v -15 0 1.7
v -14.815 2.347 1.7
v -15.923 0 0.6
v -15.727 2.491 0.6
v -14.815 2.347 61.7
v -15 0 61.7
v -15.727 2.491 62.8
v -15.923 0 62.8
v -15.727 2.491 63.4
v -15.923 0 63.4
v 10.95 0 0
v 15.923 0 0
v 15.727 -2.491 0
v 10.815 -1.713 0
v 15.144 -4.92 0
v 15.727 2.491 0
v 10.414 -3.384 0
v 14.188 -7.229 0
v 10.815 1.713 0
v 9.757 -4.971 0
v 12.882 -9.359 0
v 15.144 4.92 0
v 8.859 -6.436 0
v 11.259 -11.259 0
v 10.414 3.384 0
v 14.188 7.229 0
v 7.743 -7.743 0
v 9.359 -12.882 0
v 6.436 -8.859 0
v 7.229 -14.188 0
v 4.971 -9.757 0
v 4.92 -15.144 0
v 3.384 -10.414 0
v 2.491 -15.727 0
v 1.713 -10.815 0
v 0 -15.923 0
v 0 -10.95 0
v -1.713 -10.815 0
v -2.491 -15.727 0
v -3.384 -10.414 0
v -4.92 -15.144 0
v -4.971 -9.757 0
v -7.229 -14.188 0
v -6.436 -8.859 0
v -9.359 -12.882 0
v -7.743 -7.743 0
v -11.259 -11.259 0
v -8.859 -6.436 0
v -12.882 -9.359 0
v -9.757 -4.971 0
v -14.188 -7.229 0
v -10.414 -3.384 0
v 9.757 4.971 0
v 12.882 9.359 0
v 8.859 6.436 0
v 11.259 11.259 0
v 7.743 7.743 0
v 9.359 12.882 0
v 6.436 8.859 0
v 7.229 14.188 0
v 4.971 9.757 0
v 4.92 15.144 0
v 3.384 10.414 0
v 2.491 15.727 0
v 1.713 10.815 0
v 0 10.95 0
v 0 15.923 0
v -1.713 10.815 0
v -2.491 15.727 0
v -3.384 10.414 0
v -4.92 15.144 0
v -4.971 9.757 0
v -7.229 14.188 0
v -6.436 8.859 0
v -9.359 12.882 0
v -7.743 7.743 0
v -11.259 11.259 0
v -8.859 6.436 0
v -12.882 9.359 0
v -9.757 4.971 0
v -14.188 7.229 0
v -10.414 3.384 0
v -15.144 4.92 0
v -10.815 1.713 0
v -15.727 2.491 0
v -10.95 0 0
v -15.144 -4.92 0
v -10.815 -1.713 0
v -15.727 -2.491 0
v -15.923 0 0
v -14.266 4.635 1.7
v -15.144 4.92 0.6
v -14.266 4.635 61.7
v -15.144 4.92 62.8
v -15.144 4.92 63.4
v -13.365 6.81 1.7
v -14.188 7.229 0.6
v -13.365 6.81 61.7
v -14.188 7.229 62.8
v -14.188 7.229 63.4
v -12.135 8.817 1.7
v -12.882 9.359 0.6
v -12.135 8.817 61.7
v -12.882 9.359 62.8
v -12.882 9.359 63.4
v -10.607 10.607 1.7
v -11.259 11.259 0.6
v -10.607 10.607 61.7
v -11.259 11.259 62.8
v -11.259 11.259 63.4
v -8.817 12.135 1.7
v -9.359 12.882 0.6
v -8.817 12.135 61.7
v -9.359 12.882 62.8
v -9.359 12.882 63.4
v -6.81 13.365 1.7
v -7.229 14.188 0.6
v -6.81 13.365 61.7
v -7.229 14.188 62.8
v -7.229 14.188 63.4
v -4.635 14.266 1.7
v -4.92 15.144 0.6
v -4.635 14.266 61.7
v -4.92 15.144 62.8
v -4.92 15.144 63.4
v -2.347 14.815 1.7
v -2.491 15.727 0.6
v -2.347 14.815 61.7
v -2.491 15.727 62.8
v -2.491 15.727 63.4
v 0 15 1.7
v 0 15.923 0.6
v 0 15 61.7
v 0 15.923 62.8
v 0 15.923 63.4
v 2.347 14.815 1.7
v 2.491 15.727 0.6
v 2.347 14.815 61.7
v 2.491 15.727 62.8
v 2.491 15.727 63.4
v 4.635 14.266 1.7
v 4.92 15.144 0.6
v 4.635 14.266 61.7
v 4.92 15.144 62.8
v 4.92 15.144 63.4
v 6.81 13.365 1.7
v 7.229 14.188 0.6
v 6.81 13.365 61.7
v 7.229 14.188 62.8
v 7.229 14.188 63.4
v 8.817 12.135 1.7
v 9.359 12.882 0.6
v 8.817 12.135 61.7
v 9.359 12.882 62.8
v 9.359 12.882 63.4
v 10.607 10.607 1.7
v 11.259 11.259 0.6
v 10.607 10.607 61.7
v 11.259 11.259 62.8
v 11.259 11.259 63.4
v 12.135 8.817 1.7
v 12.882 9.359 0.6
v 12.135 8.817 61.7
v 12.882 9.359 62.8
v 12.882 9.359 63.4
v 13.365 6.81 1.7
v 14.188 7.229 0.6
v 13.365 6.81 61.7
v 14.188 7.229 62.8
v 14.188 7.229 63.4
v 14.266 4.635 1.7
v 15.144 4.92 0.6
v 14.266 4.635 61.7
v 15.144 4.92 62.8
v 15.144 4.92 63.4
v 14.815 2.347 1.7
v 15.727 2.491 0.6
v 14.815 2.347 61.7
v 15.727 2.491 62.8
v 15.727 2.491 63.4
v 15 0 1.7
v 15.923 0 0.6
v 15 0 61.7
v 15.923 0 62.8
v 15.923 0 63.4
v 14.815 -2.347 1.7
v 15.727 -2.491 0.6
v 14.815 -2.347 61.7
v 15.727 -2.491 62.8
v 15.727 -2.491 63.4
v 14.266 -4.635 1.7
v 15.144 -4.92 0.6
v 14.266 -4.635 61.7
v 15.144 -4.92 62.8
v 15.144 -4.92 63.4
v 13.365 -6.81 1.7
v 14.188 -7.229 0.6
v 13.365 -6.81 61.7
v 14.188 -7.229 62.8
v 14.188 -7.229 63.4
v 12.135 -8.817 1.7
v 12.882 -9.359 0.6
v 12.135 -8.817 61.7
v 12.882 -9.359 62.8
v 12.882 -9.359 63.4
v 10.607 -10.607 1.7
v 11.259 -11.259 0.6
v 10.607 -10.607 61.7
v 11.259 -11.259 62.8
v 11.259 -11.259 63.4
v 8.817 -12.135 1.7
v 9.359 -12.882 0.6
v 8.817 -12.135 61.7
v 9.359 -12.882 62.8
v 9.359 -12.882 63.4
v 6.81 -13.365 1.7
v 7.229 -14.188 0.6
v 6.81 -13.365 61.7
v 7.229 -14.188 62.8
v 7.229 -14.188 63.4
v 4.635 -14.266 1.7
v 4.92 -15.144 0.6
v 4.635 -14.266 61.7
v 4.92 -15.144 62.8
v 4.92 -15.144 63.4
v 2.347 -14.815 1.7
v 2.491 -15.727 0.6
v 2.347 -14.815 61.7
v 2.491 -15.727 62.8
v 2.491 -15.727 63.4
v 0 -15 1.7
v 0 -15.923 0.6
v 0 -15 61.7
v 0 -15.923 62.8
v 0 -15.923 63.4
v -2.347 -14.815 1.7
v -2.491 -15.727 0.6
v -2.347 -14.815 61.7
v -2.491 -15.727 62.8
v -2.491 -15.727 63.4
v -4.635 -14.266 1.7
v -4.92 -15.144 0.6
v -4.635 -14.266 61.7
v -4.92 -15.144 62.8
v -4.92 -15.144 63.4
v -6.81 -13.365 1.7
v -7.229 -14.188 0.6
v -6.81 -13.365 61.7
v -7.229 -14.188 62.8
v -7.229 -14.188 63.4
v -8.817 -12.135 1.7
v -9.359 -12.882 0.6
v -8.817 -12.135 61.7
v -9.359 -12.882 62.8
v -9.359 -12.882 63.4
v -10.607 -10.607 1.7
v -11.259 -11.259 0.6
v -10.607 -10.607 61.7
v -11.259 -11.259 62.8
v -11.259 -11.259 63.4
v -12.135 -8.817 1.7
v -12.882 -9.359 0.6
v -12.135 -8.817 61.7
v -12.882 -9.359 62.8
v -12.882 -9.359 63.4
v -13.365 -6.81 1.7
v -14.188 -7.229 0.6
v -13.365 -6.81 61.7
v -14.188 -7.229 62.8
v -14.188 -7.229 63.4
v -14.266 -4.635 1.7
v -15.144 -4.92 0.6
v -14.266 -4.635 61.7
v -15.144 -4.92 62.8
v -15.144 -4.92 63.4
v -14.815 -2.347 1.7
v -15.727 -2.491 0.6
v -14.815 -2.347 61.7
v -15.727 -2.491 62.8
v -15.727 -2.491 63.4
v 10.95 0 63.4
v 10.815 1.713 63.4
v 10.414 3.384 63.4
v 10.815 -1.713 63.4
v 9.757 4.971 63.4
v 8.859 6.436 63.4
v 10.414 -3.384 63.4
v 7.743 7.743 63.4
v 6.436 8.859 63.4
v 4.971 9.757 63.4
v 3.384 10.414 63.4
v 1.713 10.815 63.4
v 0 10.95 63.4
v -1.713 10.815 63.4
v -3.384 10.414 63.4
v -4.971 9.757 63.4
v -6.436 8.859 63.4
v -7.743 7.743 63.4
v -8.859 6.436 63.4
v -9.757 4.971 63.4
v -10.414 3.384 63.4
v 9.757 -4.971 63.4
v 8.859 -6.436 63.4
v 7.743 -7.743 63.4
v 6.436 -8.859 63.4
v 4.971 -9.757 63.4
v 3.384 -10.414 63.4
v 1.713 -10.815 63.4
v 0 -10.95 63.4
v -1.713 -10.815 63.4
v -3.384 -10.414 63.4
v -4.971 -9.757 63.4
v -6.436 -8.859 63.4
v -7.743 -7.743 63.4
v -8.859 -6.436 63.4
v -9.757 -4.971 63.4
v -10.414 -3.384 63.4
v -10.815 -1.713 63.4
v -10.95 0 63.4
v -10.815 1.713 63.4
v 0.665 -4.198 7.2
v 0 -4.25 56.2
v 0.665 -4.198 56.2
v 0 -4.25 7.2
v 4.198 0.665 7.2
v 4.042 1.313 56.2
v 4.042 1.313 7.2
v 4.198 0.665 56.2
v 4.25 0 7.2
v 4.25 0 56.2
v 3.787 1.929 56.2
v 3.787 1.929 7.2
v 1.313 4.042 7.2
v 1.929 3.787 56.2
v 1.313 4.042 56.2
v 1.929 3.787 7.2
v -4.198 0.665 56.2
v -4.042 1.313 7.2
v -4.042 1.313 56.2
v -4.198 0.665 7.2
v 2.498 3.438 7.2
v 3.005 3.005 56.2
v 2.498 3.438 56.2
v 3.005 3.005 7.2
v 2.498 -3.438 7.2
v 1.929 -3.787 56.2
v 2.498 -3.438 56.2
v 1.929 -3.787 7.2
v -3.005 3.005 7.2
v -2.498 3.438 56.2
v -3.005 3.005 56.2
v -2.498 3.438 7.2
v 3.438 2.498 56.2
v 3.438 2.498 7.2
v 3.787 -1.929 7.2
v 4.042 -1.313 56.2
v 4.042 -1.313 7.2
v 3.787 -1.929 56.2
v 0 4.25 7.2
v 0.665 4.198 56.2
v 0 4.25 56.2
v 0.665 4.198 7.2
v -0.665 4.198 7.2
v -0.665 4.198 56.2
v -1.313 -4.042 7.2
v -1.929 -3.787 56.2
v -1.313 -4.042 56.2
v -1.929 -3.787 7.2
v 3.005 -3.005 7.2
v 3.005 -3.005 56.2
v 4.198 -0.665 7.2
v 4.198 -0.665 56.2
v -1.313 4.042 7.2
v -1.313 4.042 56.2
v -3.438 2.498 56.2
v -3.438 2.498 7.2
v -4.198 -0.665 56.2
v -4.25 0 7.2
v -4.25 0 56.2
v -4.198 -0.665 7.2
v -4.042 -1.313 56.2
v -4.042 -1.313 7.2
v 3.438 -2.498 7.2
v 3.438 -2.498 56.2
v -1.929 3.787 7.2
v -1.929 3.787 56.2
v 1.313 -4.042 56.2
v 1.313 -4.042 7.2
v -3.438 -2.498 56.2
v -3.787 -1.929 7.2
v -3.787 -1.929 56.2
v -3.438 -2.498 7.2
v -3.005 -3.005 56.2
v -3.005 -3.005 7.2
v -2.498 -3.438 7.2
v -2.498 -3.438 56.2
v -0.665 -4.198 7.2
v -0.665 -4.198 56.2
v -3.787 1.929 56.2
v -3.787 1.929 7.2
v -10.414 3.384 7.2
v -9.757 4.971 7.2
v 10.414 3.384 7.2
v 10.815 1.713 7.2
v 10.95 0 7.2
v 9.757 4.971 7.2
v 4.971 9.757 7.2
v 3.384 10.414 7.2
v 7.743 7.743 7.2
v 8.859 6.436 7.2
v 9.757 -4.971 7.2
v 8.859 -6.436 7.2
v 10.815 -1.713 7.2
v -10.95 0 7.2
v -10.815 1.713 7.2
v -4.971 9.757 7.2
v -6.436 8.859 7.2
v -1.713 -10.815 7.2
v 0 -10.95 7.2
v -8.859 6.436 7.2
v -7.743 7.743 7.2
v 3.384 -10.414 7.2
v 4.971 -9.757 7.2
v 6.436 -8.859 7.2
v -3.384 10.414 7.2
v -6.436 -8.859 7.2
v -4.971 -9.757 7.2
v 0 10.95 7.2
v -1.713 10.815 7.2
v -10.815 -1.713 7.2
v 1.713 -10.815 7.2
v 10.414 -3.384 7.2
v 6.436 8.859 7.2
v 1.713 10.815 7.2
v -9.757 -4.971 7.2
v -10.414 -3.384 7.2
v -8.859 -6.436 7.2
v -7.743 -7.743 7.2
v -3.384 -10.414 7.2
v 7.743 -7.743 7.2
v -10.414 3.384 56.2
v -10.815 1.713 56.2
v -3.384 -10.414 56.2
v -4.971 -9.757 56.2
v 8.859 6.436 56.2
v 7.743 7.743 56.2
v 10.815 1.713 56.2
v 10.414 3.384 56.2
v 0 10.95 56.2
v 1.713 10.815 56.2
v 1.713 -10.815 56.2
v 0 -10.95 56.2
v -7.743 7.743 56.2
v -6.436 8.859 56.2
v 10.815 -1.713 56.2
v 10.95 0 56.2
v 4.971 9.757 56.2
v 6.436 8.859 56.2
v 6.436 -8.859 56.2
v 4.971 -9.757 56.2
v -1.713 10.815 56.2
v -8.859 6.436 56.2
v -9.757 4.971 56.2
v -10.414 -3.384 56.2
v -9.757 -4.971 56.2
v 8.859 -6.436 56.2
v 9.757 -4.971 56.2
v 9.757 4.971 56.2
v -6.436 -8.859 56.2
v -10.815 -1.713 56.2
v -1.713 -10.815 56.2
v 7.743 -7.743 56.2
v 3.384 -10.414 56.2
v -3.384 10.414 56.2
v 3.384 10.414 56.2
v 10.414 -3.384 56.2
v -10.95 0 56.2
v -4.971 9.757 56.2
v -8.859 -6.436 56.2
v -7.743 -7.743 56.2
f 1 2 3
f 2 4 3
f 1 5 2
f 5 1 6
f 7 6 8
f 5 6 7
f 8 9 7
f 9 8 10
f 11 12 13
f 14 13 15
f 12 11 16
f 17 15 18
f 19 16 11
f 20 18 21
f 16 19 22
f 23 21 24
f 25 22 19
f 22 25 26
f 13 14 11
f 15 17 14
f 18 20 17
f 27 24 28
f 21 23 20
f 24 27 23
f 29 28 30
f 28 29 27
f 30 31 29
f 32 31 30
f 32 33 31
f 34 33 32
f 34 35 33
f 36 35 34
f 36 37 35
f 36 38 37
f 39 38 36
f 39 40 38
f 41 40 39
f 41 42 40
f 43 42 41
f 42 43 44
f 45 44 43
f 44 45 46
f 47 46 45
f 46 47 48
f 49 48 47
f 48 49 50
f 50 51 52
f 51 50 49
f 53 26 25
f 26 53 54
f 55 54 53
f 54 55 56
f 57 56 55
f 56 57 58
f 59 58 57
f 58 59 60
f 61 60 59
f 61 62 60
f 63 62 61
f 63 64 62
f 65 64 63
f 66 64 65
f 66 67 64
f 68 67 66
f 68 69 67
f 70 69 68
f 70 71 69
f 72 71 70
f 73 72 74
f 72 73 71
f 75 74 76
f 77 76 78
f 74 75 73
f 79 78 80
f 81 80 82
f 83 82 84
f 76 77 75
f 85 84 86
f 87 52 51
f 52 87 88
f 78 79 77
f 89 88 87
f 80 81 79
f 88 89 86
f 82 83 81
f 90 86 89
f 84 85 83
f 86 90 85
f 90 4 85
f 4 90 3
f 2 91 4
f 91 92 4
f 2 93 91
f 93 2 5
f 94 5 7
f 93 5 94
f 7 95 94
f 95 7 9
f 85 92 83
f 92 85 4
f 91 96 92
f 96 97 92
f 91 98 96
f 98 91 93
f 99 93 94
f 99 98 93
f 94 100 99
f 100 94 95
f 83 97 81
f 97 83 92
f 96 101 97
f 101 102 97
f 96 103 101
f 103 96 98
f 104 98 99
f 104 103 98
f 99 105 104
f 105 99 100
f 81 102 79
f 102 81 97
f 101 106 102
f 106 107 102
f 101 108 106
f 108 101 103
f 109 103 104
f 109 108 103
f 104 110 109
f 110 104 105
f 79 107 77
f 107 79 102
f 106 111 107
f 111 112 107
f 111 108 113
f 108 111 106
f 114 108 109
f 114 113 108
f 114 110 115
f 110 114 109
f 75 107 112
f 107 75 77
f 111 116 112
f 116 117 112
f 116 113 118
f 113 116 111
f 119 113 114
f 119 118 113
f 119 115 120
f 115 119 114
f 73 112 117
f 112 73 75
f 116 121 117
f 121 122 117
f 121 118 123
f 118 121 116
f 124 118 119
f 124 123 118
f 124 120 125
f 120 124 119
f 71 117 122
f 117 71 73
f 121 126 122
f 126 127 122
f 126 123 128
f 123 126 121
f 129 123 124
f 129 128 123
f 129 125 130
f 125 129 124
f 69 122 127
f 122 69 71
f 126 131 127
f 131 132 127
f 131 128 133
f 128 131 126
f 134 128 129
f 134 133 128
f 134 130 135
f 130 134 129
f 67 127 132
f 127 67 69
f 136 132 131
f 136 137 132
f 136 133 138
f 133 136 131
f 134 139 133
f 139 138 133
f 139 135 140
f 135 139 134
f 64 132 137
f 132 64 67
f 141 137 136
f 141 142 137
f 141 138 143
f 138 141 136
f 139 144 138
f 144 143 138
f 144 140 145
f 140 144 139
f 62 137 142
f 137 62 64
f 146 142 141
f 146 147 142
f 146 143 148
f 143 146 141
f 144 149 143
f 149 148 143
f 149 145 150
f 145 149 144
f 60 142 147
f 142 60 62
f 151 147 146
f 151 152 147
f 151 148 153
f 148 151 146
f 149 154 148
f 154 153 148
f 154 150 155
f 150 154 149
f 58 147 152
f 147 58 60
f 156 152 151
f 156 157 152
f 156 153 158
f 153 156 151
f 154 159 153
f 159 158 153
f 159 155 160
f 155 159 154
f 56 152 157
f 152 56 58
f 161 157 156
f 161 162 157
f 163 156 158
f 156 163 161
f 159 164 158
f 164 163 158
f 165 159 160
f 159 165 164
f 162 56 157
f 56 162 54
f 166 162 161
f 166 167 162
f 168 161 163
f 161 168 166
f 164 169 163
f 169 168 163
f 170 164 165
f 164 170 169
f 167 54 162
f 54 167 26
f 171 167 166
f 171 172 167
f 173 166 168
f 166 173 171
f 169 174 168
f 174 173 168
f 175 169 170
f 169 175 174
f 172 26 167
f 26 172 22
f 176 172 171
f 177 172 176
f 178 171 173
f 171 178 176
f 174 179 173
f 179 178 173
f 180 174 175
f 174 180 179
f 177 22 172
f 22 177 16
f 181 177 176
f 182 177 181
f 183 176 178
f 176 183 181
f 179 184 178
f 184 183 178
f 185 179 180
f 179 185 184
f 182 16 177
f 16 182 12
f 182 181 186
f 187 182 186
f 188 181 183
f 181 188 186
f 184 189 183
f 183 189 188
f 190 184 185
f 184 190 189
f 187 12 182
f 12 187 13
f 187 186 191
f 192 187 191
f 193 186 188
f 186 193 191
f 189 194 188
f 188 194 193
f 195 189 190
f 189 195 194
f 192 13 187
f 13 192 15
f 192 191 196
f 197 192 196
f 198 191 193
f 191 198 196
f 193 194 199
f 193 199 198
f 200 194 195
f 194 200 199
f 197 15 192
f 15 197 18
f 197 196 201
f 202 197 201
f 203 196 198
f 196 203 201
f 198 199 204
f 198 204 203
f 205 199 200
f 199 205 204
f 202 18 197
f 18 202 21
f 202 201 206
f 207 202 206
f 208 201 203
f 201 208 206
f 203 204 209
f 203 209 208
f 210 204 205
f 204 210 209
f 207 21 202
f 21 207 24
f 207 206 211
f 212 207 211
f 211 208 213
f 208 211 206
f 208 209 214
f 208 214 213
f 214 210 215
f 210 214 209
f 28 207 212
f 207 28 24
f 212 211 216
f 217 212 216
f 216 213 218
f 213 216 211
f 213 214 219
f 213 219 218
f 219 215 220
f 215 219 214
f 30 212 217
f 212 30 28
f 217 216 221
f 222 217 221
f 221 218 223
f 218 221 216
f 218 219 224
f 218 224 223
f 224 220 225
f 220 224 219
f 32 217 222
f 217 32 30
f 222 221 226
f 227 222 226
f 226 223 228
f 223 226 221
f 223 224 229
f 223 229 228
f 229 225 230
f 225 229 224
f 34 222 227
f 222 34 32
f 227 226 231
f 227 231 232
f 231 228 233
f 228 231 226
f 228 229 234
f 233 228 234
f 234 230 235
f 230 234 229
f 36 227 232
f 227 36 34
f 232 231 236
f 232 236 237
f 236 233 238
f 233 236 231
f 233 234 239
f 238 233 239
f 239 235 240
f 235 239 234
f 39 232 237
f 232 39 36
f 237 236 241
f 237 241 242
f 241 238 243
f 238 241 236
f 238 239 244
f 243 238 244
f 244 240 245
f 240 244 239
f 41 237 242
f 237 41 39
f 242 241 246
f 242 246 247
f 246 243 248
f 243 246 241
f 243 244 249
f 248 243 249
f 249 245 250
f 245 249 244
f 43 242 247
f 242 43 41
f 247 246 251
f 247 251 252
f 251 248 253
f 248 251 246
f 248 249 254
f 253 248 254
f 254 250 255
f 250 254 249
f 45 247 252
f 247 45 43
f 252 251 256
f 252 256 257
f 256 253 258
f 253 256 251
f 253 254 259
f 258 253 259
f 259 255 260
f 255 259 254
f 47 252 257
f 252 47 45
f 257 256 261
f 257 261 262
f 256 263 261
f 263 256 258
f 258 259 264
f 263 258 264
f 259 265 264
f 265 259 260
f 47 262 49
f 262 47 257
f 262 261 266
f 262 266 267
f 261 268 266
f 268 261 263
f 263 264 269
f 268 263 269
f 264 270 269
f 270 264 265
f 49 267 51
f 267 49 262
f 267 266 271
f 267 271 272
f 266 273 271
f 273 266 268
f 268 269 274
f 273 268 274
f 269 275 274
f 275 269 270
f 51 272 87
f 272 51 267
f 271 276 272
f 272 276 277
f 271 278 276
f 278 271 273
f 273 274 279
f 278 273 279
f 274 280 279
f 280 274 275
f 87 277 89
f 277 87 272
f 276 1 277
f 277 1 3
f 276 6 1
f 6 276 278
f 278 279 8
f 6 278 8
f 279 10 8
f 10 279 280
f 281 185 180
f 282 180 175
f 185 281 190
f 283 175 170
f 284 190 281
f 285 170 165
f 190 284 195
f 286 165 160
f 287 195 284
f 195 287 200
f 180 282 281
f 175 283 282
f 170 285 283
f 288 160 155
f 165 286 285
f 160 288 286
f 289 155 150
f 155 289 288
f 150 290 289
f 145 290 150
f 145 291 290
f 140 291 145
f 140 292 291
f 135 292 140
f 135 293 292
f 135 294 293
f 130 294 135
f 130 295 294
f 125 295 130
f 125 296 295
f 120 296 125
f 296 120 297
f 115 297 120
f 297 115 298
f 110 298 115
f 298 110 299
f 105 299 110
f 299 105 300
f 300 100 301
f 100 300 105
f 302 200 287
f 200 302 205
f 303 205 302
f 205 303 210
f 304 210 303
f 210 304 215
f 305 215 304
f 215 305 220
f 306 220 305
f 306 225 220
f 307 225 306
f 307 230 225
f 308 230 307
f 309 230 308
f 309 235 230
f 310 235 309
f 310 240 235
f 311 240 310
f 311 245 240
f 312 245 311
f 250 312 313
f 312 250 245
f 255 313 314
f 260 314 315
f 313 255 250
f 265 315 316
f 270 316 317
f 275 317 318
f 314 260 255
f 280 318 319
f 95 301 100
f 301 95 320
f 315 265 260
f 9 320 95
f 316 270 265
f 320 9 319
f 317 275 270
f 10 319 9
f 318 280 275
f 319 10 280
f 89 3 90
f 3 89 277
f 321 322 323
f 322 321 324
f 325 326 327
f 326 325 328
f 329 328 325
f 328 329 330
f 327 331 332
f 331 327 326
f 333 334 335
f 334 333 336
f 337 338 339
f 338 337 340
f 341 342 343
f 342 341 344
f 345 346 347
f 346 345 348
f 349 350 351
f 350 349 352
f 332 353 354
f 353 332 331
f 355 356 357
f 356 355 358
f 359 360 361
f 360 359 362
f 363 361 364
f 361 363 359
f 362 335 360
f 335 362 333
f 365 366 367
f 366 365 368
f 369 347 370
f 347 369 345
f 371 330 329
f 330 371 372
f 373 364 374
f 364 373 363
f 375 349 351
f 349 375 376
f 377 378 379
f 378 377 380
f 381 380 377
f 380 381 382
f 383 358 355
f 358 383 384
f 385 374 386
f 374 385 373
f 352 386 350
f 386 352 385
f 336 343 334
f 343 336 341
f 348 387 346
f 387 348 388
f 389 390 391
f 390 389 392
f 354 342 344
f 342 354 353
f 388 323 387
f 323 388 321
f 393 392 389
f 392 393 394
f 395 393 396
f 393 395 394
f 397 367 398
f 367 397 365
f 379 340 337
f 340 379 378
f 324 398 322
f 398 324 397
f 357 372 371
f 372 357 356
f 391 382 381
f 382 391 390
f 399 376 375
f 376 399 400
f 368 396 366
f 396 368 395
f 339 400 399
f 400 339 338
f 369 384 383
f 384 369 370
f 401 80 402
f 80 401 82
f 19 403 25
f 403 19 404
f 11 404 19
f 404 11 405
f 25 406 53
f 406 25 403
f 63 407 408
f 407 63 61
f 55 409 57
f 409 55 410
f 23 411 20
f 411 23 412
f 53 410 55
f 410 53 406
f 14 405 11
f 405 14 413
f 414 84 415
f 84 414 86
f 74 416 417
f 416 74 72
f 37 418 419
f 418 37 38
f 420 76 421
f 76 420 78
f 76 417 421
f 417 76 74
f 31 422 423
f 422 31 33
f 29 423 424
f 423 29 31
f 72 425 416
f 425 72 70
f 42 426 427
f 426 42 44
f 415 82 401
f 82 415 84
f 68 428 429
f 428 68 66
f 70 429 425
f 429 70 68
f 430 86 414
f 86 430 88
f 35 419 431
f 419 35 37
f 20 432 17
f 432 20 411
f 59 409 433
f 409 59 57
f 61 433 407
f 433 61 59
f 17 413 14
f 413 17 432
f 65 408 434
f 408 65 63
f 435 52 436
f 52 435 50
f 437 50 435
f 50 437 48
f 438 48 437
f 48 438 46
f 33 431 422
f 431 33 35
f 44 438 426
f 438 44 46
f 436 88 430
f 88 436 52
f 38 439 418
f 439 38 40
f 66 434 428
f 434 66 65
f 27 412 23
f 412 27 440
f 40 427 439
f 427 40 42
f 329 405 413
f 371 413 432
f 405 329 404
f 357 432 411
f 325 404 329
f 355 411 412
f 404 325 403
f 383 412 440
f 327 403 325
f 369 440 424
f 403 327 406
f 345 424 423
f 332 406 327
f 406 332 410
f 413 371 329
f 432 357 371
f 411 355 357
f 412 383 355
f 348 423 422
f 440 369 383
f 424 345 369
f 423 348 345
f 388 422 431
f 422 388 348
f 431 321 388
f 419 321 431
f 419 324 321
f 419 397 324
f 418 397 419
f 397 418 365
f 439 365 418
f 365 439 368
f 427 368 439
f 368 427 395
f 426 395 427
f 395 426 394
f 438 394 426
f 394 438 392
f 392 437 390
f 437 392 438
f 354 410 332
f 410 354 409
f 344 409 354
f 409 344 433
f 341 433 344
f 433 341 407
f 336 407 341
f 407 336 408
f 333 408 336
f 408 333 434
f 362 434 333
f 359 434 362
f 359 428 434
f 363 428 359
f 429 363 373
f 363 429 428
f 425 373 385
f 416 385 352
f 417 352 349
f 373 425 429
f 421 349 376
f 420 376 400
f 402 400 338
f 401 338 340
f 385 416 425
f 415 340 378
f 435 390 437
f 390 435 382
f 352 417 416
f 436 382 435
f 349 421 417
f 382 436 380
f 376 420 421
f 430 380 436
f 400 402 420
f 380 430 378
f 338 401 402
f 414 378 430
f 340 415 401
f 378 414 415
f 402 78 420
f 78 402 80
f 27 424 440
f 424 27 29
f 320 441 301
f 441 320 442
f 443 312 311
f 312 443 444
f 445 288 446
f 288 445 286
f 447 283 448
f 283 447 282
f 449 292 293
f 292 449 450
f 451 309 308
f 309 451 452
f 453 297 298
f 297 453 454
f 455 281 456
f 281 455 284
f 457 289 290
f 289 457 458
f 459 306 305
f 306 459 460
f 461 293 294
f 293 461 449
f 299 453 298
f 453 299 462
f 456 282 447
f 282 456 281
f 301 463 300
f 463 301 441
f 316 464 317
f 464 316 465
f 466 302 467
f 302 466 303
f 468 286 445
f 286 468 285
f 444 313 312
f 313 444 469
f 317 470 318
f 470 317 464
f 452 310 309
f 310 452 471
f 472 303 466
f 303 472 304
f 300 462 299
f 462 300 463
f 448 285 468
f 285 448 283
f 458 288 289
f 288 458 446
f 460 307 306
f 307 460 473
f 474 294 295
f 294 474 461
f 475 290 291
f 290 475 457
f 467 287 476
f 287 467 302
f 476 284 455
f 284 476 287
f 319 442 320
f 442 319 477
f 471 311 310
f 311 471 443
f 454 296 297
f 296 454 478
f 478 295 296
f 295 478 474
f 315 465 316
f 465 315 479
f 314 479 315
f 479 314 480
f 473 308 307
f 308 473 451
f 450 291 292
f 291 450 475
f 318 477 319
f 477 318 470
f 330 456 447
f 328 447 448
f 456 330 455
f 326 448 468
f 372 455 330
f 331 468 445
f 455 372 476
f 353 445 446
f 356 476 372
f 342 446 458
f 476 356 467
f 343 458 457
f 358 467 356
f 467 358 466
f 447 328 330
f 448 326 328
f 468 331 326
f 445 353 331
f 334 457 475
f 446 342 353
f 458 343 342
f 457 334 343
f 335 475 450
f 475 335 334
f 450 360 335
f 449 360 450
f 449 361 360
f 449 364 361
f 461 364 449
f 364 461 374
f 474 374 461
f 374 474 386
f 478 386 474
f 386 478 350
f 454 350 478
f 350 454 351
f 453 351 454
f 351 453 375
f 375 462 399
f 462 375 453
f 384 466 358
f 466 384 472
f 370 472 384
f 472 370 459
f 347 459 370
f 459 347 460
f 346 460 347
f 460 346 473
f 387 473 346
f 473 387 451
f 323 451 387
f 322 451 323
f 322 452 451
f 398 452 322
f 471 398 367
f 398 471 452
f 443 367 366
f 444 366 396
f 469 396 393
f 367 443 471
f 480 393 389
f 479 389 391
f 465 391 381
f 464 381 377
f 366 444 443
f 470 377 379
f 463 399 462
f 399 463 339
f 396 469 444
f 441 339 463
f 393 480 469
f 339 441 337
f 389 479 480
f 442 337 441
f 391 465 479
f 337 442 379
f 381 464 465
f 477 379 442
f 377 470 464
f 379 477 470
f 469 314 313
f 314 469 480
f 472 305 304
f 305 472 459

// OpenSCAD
include <../lib/spool-drybox-lib.scad>;
$fn = 40;
roller();
